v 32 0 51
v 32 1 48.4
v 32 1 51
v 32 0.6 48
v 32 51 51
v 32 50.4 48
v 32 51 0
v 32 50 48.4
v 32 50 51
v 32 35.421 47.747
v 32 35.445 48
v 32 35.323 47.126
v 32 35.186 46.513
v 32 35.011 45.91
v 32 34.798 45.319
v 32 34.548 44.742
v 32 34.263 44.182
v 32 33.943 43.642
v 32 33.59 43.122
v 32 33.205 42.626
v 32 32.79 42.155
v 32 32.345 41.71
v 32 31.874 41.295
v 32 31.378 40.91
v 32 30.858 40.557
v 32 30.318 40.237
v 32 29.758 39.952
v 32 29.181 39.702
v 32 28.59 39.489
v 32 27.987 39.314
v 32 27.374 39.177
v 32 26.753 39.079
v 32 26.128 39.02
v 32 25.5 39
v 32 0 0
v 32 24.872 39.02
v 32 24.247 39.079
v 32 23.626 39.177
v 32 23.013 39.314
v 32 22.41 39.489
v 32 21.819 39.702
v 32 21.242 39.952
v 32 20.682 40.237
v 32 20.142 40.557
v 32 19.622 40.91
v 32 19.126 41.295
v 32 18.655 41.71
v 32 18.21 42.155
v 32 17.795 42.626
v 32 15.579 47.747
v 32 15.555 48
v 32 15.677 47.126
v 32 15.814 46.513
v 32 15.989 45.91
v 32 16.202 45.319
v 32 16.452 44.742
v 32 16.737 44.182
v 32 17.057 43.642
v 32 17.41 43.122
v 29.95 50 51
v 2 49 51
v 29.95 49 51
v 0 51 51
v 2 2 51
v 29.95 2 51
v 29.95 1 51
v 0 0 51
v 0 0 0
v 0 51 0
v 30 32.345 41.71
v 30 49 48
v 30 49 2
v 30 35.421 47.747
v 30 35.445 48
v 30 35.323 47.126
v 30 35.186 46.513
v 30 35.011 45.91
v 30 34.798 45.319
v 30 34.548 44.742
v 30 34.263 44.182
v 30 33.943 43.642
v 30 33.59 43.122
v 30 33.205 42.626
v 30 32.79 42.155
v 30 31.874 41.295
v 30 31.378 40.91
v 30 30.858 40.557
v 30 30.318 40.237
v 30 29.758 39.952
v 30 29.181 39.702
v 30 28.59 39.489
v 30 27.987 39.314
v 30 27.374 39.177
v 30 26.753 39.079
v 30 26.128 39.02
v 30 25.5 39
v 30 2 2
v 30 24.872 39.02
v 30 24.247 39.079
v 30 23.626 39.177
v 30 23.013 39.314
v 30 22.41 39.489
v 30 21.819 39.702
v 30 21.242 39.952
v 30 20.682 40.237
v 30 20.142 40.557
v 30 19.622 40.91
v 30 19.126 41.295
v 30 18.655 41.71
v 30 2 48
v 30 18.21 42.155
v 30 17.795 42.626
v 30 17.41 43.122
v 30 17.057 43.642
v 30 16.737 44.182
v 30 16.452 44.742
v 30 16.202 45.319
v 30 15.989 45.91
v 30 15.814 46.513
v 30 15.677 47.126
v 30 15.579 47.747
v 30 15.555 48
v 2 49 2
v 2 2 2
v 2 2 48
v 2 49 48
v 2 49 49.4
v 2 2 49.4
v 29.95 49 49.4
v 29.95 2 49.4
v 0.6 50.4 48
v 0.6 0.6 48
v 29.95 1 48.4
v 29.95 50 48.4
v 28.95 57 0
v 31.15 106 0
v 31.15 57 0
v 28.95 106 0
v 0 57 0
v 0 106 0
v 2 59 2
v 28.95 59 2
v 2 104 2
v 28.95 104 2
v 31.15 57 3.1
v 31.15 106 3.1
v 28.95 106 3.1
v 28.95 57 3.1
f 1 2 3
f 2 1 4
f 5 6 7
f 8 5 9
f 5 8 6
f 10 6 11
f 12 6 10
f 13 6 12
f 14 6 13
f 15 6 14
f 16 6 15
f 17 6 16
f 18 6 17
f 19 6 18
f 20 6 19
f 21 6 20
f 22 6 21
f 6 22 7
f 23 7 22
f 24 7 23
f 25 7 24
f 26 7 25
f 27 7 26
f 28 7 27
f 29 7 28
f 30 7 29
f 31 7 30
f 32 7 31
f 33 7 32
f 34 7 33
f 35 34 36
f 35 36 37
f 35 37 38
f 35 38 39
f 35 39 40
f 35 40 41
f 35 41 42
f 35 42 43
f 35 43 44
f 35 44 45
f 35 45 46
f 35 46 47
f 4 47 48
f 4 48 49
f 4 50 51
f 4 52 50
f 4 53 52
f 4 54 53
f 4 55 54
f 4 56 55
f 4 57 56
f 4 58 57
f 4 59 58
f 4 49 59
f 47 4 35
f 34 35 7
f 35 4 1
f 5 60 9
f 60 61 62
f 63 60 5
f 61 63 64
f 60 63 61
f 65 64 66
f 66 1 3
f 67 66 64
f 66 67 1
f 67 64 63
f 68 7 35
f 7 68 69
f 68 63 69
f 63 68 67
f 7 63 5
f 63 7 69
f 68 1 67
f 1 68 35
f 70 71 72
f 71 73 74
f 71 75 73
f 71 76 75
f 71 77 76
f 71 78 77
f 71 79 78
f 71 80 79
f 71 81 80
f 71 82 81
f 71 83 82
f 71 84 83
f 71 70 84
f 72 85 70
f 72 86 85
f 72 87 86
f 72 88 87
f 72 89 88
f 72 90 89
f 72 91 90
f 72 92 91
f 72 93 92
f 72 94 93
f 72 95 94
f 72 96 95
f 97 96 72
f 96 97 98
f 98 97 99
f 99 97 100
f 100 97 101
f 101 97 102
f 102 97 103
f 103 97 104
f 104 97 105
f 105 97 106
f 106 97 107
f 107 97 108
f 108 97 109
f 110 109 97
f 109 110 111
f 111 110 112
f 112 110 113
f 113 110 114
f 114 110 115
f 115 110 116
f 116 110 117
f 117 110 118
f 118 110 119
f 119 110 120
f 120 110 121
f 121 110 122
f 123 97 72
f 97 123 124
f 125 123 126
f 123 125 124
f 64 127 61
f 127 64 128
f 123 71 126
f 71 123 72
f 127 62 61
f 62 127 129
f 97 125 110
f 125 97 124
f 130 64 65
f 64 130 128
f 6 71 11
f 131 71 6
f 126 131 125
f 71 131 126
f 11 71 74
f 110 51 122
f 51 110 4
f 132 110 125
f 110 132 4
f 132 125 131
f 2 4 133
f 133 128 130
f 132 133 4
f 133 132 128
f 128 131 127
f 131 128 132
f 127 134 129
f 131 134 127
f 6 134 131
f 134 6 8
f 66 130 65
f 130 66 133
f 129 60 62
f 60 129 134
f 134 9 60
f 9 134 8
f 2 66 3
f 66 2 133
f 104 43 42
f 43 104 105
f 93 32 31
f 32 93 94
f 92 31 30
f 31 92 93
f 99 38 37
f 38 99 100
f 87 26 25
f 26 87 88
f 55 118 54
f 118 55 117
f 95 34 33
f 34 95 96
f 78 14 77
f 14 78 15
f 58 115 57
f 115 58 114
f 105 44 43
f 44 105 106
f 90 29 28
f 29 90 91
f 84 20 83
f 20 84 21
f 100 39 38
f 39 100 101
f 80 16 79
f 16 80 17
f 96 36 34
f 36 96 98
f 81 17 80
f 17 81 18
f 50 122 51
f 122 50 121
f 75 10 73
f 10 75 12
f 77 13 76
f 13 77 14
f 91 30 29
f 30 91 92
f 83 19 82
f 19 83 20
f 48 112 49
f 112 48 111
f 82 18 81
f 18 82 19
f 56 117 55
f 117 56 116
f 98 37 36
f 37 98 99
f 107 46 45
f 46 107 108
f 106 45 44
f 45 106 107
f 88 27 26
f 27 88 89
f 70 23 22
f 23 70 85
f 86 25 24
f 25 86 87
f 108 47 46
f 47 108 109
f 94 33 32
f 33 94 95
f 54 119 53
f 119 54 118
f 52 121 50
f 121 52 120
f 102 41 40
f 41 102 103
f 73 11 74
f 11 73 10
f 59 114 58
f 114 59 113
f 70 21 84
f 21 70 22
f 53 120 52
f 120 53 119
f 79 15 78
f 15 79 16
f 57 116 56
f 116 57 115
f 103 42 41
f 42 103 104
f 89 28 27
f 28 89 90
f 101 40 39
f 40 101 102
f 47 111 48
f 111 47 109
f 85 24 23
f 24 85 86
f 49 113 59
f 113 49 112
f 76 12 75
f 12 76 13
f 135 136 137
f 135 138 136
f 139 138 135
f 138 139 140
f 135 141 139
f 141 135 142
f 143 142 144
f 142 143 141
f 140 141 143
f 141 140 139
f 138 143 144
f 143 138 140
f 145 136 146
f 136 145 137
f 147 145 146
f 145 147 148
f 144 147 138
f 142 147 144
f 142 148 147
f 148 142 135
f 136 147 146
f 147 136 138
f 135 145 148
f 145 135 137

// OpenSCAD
// file: carcassonne_box.scad
/**
 * @file carcassonne_box.scad
 * @author Conlan Wesson
 * Template for Carcossonne boxes.
 * @copyright Creative Commons Attribution-NonCommercial-ShareAlike 4.0
 */

mm = 1;
cm = 10*mm;

width = 47*mm;
thick = 2.5*mm;
wall = 2*mm;
//add = +16.5*mm;

/**
 * Lid for box.
 * @param count Number of cards.
 * @param columns Number of columns.
 * @param icon Path to icon DXF file.
 * @param rot Icon rotation in degrees.
 * @param mult Icon scale.
 * @param xoff X-offset of icon from center.
 * @param yoff Y-offset of icon from center.
 */
module carcassonne_lid(count, columns=1, icon=false, icon2=false, icon3=false, rot=0, mult=1, xoff=0, yoff=0, mult2=1, xoff2=0, yoff2=0, mult3=1, xoff3=0, yoff3=0, g=0){
	length = (thick * count) + ((width/2) - ((thick * count) % (width/2))+add);
	w = length+(1.5*wall)+.1;
	l = (width*columns)+wall;
	h = wall;
	d = 2;

	CubePoints = [
		[ 0-g, 0-g,   0 ],  //0
		[ w+g, 0-g,   0 ],  //1
		[ w+g, l+g,   0 ],  //2
		[ 0-g, l+g,   0 ],  //3
		[   d,   d, h+g ],  //4
		[   w,   d, h+g ],  //5
		[   w, l-d, h+g ],  //6
		[   d, l-d, h+g ]   //7
	];
	
	CubeFaces = [
		[0,1,2,3],  // bottom
		[4,5,1,0],  // front
		[7,6,5,4],  // top
		[5,6,2,1],  // right
		[6,7,3,2],  // back
		[7,4,0,3]   // left
	];
	
	
	difference(){
		union(){
			polyhedron( CubePoints, CubeFaces );
			translate([w-wall-.15,0,0]) cube([wall+.2,l, (1.5*wall)+.1]);
		}
		if(icon){
			translate([w/2+xoff,l/3+yoff,h-(wall/2)]){
				linear_extrude(height=(wall)+.1){
					rotate(rot) scale(mult) import(icon);
				}
			}
		}
        if(icon2){
			translate([w/2+xoff2,l/3+yoff2,h-(wall/2)]){
				linear_extrude(height=(wall)+.1){
					rotate(rot) scale(mult2) import(icon2);
				}
			}
		}
        if(icon3){
			translate([w/2+xoff3,l/3+yoff3,h-(wall/2)]){
				linear_extrude(height=(wall)+.1){
					rotate(rot) scale(mult3) import(icon3);
				}
			}
		}
	}
}

/**
 * Carcassonne card box.
 * @param count Number of cards.
 * @param dividers Array of divider positions.
 * @param columns Number of columns.
 */
module carcassonne_box(count, dividers=[], columns=1, add, div1, div2){
	length = (thick * count) + ((width/2) - ((thick * count) % (width/2))+add);
	difference(){
		union(){
			difference(){
				// Outer walls
				cube([length+(2*wall), (width*columns)+(2*wall), width+(2*wall)]);
				// Cavity
				translate([wall, wall, wall]){
					cube([length, width*columns, (width+wall)+.1]);
				}
			}
			// Dividers
			for(col = [0:columns-1]){
				for(div = dividers[col]){
					if (div==1){
                        translate([(div*(width/2))+(wall/2)+div1, width*col+wall, 0]) cube([wall/2, width, width-(2*wall)]);
                    }
                    if (div==2){
                        translate([(div*(width/2))+(wall/2)+div2, width*col+wall, 0]) cube([wall/2, width, width-(2*wall)]);
                    }
				}
				if(col > 0){
					translate([0, width*col+(wall/2), 0]) cube([length+(2*wall)-18.0, wall/2, width-(2*wall)]);
				}
			}
		}
		union(){
			// Notch
			for(col = [0:columns-1]){
				translate([wall, wall+(width*col), wall]){
					translate([0, width/2, width])
					rotate([0, 90, 0]){
						cylinder(r=10, h=length+(2*wall), $fn=100);
					}
				}
			}
			// Track
			translate([wall/2,wall/2,width+wall/2]) carcassonne_lid(count, columns, g=0.4);
		}
	}
}
// main file
/**
 * @file spell-circles.scad
 * @author Andrew Hargrave
 * Spell Circles Carcossonne box.
 * @copyright Creative Commons Attribution-NonCommercial-ShareAlike 4.0
 */

include <carcassonne_box.scad>

count = 4;
dividers = [[]];
columns = 1;
add = 4.5;
div1 = 0;
div2 = 0;

carcassonne_box(count, dividers, columns, add, div1, div2);
translate([0,width*columns+10,0]) carcassonne_lid(count, columns, icon="11-0-spell-circles.dxf", rot=90, mult=2.2, xoff=21, yoff=-9);
